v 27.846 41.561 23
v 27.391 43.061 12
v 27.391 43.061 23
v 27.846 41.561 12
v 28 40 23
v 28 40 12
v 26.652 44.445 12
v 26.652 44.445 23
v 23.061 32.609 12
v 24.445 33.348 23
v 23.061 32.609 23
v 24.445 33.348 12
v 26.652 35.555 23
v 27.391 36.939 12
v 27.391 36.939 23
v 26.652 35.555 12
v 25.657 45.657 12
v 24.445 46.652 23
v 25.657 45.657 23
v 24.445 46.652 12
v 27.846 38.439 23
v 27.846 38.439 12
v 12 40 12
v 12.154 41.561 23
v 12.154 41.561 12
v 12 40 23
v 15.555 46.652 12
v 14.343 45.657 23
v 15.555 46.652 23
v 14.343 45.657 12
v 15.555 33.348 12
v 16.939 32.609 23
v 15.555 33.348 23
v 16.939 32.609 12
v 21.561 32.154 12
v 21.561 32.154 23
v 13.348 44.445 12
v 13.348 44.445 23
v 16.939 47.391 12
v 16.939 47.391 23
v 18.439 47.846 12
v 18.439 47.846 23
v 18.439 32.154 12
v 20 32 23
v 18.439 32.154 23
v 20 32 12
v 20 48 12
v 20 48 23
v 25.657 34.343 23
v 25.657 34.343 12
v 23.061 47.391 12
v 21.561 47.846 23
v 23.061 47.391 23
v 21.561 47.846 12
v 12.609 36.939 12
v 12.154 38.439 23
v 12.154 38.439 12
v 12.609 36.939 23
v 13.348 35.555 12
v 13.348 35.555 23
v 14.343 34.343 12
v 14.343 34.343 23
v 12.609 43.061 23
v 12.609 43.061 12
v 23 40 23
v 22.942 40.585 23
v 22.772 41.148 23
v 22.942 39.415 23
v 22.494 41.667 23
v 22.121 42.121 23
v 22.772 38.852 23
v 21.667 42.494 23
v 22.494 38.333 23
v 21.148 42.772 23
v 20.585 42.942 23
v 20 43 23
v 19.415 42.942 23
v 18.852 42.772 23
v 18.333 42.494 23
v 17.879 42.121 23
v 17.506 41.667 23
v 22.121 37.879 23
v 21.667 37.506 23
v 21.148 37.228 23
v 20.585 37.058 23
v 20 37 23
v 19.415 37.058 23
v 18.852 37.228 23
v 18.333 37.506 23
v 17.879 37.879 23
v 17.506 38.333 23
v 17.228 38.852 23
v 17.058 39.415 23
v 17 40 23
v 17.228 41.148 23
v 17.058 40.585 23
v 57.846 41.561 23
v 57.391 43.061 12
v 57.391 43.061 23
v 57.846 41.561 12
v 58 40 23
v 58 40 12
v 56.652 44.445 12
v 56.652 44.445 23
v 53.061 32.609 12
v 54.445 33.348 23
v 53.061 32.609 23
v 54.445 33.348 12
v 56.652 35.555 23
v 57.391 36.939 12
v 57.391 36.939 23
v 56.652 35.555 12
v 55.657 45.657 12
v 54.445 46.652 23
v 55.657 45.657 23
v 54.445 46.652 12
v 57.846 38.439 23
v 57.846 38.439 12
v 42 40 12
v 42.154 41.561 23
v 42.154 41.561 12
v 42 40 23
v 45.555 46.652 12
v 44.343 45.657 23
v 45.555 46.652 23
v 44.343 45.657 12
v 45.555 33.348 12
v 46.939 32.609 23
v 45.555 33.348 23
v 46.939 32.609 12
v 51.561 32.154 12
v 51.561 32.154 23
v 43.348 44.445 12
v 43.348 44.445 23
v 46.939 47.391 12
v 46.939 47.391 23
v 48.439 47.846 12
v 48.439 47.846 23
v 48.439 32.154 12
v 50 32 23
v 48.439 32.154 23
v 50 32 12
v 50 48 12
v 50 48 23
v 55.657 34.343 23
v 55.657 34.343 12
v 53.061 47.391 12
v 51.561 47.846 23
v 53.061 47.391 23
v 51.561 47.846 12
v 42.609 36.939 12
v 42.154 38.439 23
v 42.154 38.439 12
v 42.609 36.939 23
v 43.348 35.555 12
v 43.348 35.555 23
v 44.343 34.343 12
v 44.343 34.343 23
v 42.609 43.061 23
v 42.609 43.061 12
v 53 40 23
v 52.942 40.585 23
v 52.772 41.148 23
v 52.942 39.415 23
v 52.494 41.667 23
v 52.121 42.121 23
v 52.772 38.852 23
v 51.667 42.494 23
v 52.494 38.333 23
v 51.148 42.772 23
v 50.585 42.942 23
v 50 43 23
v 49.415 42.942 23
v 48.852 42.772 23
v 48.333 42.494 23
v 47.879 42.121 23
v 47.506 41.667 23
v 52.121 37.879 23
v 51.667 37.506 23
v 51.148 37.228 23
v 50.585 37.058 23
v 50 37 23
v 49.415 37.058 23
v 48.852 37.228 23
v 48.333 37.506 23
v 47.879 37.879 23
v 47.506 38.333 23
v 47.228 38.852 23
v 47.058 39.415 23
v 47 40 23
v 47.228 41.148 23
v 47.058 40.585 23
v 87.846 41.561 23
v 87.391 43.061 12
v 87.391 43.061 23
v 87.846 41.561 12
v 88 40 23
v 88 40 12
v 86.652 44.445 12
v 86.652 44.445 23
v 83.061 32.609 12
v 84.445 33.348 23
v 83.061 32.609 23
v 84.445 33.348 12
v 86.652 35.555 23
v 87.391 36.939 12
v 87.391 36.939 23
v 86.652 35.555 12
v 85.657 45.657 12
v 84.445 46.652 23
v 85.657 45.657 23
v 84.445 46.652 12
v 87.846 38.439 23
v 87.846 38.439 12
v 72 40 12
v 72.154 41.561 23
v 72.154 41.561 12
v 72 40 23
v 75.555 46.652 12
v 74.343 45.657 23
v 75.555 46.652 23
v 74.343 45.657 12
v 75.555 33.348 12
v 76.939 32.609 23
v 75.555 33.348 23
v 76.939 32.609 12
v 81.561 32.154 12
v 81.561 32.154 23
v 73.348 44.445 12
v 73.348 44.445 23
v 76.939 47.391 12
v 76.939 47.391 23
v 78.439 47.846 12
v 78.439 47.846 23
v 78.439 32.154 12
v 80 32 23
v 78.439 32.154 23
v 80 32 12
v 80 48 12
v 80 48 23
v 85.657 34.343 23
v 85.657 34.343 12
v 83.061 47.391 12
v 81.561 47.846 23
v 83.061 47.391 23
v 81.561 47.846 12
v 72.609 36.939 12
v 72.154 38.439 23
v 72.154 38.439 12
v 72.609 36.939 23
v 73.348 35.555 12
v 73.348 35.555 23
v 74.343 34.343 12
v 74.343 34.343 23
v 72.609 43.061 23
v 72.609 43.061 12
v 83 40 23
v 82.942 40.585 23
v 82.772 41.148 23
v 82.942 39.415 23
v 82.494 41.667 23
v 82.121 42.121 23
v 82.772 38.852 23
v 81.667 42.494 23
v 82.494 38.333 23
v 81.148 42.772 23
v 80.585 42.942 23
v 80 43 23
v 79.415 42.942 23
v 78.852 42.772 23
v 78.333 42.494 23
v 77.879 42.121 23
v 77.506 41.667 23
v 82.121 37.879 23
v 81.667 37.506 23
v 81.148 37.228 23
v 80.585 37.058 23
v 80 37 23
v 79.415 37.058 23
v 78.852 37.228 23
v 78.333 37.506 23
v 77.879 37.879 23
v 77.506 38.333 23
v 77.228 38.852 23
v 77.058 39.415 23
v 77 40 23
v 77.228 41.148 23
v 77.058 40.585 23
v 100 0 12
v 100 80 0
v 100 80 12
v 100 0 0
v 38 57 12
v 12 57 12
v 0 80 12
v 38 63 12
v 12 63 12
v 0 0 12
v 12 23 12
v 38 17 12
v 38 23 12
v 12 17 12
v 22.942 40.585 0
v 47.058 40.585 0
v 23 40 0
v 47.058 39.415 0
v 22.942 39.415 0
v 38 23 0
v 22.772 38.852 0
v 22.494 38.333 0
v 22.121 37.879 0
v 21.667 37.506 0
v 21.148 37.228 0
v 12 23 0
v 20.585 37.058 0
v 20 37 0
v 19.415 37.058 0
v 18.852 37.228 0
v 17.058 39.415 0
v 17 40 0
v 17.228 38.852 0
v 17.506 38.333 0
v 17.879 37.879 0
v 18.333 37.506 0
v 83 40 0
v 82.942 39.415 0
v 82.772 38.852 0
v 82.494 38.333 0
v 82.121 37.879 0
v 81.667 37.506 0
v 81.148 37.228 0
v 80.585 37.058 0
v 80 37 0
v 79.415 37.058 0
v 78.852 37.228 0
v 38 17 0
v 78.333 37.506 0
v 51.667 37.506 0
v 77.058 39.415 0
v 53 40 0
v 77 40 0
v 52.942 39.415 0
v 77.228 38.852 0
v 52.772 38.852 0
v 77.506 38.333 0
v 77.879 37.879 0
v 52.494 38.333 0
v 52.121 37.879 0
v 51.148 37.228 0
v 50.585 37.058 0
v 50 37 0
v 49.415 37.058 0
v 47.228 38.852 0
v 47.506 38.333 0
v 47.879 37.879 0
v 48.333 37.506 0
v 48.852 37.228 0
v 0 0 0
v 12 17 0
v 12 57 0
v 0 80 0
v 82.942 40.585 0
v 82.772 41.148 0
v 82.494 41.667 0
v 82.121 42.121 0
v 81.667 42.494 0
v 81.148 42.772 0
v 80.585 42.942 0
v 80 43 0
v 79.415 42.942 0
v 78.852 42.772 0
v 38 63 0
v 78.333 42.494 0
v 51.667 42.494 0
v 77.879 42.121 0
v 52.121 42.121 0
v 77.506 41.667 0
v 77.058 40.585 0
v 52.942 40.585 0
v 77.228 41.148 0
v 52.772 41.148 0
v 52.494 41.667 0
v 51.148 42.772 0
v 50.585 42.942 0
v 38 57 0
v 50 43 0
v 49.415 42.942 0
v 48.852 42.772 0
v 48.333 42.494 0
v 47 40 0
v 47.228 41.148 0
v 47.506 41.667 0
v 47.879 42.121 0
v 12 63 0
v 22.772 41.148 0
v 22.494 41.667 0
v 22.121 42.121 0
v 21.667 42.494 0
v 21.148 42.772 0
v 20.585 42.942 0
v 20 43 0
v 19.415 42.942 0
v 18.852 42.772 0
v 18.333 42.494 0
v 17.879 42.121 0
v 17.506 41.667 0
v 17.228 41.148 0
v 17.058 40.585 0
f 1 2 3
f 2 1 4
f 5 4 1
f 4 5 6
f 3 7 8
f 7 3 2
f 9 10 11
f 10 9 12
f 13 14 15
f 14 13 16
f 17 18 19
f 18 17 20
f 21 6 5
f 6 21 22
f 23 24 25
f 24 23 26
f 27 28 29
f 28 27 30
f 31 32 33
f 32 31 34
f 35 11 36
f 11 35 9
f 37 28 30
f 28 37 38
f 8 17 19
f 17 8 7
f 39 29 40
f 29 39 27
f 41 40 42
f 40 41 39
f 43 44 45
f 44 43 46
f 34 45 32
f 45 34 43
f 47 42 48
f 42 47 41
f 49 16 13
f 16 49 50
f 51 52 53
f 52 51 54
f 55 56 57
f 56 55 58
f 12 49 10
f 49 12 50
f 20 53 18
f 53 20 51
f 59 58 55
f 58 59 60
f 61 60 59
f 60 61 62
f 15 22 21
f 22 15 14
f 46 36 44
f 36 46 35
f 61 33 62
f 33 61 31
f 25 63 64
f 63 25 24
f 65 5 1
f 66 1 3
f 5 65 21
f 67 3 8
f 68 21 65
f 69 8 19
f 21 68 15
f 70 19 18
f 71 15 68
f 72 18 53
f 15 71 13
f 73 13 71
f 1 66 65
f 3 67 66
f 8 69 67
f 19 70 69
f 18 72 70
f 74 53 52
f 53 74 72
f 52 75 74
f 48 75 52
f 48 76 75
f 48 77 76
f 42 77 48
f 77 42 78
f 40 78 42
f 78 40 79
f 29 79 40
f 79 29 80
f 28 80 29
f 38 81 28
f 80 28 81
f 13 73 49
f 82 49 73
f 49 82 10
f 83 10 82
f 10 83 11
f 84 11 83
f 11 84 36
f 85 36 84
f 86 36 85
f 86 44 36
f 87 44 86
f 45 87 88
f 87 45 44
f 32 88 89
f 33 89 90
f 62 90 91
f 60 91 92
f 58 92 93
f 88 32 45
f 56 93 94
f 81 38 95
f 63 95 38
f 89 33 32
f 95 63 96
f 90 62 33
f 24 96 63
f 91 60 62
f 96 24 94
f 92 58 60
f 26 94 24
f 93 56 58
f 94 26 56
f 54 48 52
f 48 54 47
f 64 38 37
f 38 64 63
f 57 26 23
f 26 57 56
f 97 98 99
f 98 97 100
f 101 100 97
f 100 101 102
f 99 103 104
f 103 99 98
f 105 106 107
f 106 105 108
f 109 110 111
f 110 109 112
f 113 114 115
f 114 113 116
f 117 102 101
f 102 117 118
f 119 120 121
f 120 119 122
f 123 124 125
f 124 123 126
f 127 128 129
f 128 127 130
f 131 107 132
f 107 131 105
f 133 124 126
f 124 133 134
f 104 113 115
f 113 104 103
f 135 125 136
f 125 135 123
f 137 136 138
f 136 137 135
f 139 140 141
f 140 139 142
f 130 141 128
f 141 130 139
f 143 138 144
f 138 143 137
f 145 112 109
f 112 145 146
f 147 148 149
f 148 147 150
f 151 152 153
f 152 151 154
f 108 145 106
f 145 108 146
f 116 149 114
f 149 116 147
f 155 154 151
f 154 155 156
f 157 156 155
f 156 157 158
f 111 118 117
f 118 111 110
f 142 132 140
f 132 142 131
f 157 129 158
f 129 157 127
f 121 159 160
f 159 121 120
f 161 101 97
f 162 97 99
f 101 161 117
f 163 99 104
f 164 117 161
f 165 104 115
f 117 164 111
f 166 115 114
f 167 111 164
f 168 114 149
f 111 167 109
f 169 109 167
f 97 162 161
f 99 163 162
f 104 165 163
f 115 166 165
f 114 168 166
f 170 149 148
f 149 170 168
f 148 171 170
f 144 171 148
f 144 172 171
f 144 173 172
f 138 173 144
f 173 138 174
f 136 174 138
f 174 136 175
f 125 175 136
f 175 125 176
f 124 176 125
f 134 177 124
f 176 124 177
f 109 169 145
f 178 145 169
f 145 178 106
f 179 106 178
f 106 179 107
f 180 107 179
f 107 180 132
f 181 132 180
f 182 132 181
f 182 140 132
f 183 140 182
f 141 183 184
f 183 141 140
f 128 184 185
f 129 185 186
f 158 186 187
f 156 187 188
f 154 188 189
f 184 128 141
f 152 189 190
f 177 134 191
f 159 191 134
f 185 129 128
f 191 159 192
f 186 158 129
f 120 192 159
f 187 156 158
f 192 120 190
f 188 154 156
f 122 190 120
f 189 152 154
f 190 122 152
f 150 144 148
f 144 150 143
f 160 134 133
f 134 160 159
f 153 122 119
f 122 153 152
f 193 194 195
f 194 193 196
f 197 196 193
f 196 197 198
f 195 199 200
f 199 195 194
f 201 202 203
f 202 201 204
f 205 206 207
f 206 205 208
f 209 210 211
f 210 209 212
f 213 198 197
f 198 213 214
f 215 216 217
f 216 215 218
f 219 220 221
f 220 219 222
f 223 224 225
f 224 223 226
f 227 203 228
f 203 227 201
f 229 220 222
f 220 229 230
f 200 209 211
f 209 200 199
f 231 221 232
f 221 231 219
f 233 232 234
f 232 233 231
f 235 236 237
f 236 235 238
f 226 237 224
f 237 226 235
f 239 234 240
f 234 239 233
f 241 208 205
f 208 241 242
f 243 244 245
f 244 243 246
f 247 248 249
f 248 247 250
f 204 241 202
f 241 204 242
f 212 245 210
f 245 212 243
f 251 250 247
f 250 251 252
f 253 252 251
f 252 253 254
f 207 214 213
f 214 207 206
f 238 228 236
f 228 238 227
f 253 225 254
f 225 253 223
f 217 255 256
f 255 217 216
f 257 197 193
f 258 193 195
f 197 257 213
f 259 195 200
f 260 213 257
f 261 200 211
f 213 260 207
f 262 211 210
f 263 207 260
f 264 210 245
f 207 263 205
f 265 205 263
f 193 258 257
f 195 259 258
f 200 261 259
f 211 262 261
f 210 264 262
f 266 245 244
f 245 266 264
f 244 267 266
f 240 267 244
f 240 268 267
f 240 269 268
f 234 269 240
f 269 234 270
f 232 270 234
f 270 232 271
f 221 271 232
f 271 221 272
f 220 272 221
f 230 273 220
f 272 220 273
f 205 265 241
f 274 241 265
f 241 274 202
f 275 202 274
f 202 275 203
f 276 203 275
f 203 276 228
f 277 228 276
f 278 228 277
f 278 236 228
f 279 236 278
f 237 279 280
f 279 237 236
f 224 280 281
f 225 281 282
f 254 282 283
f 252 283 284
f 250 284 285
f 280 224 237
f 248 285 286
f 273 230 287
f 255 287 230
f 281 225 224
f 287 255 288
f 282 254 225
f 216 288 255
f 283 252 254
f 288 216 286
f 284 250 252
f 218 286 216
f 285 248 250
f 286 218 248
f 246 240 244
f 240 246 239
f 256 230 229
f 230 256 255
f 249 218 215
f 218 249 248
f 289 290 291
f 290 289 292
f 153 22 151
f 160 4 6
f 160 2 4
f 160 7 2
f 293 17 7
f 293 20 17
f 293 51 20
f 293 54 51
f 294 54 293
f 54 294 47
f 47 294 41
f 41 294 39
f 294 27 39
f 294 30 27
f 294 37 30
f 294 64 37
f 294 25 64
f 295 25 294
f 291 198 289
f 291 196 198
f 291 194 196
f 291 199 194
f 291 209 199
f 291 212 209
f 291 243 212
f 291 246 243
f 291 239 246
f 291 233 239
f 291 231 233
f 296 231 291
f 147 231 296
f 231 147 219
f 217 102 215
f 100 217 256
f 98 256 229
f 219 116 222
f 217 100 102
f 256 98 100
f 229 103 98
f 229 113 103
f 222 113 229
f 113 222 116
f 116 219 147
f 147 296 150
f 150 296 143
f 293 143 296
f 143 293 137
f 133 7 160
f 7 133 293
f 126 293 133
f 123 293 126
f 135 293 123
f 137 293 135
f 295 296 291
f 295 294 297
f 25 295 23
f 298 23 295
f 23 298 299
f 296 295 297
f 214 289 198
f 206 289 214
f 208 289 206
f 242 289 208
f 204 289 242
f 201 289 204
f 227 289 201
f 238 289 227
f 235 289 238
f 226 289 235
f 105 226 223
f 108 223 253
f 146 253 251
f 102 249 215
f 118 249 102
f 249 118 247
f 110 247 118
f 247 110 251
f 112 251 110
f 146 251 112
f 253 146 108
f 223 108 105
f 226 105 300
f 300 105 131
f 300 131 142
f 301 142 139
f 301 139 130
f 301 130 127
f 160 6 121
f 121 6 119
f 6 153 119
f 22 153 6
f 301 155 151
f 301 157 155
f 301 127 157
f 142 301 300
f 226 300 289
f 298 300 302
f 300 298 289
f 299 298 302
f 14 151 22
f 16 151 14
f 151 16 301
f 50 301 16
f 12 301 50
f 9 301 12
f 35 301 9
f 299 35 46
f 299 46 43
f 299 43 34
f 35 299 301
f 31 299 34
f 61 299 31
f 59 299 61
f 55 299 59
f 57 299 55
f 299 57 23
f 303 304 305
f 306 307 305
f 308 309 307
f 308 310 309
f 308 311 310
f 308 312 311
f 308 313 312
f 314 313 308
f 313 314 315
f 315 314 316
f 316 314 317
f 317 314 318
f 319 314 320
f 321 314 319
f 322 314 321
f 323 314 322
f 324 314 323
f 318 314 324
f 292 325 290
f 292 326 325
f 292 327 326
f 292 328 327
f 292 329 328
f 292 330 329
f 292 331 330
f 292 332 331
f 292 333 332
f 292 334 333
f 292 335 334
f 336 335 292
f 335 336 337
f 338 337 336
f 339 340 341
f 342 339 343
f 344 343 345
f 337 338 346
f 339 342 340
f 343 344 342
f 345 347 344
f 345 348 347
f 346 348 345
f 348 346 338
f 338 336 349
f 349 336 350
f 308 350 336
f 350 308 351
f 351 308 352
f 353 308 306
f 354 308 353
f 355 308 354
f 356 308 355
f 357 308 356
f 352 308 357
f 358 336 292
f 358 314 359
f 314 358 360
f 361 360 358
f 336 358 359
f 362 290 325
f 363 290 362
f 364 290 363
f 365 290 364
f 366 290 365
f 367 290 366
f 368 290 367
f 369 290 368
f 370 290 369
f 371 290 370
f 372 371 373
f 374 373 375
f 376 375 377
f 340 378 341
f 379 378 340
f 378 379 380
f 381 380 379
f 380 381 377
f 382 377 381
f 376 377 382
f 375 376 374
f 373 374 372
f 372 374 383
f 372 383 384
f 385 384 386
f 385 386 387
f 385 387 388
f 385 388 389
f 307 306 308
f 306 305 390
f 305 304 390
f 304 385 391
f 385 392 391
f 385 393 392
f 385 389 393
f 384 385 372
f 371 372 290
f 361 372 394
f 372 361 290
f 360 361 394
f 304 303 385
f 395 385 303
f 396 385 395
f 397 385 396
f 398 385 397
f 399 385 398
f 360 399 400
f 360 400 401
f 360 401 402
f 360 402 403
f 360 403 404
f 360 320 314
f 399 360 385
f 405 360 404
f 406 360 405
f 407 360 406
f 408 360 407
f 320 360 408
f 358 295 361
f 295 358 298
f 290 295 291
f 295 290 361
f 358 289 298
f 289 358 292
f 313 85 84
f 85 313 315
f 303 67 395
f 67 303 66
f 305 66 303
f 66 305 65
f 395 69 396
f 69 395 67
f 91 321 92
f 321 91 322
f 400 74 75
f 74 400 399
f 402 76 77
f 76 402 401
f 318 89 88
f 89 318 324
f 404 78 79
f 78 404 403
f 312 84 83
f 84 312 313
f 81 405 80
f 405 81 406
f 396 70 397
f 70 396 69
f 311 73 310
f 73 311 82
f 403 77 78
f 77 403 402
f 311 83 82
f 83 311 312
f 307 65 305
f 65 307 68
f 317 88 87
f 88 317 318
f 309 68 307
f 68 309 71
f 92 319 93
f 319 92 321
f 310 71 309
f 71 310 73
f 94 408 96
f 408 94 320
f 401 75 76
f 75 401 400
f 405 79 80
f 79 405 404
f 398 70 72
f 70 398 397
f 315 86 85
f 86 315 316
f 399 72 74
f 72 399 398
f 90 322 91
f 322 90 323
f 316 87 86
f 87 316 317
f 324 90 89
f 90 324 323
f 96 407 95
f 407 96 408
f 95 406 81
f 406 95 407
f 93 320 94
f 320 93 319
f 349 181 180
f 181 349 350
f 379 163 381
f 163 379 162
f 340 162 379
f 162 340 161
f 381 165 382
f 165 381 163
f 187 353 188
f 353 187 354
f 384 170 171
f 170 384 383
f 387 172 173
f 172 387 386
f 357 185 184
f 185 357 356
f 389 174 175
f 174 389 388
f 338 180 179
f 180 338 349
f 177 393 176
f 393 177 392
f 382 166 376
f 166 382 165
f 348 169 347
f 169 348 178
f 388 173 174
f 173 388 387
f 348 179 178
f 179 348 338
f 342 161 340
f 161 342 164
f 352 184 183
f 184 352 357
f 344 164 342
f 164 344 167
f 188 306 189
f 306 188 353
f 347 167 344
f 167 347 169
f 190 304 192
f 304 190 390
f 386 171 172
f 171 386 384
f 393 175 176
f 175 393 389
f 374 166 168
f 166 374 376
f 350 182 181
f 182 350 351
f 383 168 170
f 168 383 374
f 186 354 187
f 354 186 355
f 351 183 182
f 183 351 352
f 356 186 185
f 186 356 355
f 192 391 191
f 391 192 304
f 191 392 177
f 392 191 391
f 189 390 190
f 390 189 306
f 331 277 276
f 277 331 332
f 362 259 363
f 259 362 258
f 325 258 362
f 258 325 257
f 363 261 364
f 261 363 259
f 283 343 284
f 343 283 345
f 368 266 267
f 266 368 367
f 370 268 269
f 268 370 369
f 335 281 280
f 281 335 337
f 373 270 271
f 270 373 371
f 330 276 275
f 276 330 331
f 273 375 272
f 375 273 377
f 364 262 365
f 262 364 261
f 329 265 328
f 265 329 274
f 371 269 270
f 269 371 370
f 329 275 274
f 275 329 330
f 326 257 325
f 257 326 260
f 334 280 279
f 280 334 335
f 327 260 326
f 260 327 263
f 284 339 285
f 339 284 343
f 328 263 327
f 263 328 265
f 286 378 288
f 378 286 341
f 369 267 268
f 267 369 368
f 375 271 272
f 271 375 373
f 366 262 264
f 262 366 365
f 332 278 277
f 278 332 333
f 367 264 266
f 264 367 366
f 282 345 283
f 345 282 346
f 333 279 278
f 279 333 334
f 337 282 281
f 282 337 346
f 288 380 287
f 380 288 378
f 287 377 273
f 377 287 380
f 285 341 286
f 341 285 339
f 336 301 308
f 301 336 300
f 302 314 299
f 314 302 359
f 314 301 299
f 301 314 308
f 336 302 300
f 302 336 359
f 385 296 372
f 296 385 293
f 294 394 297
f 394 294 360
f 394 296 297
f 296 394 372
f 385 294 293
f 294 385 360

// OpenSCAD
$fn = 32;

// ----------------------------------------------------------------------
// Drill jig: three_boss_slot jig
// ----------------------------------------------------------------------

// --- parameters (mm) ---
plate_l = 100;            // plate length, X
plate_w = 80;             // plate width, Y
plate_t = 12;             // plate thickness
boss_d = 16;              // guide boss diameter
boss_h = 12;              // boss height above the plate
guide_d = 6;              // guide hole diameter
boss_pitch = 30;          // boss pitch
slot_w = 6;               // clamp slot width
slot_l = 26;              // clamp slot length
slot_x = 12;              // slot start X

n_boss = 3;  // guide bosses
boss_x0 = (plate_l - (n_boss - 1) * boss_pitch) / 2;  // first boss X
boss_top = plate_t - 1 + boss_h;  // boss crown height
total_h = boss_top;  // overall height

difference() {
  union() {
  cube([plate_l, plate_w, plate_t]);
  for (i = [0 : n_boss - 1])
    translate([boss_x0 + i * boss_pitch, plate_w / 2, plate_t - 1])
      cylinder(h = boss_h, d = boss_d);
  }
  for (i = [0 : n_boss - 1])
    translate([boss_x0 + i * boss_pitch, plate_w / 2, -1])
      cylinder(h = plate_t + boss_h, d = guide_d);
  for (cy = [plate_w * 0.25, plate_w * 0.75])
    translate([slot_x, cy - slot_w / 2, -1])
      cube([slot_l, slot_w, plate_t + 2]);
}
